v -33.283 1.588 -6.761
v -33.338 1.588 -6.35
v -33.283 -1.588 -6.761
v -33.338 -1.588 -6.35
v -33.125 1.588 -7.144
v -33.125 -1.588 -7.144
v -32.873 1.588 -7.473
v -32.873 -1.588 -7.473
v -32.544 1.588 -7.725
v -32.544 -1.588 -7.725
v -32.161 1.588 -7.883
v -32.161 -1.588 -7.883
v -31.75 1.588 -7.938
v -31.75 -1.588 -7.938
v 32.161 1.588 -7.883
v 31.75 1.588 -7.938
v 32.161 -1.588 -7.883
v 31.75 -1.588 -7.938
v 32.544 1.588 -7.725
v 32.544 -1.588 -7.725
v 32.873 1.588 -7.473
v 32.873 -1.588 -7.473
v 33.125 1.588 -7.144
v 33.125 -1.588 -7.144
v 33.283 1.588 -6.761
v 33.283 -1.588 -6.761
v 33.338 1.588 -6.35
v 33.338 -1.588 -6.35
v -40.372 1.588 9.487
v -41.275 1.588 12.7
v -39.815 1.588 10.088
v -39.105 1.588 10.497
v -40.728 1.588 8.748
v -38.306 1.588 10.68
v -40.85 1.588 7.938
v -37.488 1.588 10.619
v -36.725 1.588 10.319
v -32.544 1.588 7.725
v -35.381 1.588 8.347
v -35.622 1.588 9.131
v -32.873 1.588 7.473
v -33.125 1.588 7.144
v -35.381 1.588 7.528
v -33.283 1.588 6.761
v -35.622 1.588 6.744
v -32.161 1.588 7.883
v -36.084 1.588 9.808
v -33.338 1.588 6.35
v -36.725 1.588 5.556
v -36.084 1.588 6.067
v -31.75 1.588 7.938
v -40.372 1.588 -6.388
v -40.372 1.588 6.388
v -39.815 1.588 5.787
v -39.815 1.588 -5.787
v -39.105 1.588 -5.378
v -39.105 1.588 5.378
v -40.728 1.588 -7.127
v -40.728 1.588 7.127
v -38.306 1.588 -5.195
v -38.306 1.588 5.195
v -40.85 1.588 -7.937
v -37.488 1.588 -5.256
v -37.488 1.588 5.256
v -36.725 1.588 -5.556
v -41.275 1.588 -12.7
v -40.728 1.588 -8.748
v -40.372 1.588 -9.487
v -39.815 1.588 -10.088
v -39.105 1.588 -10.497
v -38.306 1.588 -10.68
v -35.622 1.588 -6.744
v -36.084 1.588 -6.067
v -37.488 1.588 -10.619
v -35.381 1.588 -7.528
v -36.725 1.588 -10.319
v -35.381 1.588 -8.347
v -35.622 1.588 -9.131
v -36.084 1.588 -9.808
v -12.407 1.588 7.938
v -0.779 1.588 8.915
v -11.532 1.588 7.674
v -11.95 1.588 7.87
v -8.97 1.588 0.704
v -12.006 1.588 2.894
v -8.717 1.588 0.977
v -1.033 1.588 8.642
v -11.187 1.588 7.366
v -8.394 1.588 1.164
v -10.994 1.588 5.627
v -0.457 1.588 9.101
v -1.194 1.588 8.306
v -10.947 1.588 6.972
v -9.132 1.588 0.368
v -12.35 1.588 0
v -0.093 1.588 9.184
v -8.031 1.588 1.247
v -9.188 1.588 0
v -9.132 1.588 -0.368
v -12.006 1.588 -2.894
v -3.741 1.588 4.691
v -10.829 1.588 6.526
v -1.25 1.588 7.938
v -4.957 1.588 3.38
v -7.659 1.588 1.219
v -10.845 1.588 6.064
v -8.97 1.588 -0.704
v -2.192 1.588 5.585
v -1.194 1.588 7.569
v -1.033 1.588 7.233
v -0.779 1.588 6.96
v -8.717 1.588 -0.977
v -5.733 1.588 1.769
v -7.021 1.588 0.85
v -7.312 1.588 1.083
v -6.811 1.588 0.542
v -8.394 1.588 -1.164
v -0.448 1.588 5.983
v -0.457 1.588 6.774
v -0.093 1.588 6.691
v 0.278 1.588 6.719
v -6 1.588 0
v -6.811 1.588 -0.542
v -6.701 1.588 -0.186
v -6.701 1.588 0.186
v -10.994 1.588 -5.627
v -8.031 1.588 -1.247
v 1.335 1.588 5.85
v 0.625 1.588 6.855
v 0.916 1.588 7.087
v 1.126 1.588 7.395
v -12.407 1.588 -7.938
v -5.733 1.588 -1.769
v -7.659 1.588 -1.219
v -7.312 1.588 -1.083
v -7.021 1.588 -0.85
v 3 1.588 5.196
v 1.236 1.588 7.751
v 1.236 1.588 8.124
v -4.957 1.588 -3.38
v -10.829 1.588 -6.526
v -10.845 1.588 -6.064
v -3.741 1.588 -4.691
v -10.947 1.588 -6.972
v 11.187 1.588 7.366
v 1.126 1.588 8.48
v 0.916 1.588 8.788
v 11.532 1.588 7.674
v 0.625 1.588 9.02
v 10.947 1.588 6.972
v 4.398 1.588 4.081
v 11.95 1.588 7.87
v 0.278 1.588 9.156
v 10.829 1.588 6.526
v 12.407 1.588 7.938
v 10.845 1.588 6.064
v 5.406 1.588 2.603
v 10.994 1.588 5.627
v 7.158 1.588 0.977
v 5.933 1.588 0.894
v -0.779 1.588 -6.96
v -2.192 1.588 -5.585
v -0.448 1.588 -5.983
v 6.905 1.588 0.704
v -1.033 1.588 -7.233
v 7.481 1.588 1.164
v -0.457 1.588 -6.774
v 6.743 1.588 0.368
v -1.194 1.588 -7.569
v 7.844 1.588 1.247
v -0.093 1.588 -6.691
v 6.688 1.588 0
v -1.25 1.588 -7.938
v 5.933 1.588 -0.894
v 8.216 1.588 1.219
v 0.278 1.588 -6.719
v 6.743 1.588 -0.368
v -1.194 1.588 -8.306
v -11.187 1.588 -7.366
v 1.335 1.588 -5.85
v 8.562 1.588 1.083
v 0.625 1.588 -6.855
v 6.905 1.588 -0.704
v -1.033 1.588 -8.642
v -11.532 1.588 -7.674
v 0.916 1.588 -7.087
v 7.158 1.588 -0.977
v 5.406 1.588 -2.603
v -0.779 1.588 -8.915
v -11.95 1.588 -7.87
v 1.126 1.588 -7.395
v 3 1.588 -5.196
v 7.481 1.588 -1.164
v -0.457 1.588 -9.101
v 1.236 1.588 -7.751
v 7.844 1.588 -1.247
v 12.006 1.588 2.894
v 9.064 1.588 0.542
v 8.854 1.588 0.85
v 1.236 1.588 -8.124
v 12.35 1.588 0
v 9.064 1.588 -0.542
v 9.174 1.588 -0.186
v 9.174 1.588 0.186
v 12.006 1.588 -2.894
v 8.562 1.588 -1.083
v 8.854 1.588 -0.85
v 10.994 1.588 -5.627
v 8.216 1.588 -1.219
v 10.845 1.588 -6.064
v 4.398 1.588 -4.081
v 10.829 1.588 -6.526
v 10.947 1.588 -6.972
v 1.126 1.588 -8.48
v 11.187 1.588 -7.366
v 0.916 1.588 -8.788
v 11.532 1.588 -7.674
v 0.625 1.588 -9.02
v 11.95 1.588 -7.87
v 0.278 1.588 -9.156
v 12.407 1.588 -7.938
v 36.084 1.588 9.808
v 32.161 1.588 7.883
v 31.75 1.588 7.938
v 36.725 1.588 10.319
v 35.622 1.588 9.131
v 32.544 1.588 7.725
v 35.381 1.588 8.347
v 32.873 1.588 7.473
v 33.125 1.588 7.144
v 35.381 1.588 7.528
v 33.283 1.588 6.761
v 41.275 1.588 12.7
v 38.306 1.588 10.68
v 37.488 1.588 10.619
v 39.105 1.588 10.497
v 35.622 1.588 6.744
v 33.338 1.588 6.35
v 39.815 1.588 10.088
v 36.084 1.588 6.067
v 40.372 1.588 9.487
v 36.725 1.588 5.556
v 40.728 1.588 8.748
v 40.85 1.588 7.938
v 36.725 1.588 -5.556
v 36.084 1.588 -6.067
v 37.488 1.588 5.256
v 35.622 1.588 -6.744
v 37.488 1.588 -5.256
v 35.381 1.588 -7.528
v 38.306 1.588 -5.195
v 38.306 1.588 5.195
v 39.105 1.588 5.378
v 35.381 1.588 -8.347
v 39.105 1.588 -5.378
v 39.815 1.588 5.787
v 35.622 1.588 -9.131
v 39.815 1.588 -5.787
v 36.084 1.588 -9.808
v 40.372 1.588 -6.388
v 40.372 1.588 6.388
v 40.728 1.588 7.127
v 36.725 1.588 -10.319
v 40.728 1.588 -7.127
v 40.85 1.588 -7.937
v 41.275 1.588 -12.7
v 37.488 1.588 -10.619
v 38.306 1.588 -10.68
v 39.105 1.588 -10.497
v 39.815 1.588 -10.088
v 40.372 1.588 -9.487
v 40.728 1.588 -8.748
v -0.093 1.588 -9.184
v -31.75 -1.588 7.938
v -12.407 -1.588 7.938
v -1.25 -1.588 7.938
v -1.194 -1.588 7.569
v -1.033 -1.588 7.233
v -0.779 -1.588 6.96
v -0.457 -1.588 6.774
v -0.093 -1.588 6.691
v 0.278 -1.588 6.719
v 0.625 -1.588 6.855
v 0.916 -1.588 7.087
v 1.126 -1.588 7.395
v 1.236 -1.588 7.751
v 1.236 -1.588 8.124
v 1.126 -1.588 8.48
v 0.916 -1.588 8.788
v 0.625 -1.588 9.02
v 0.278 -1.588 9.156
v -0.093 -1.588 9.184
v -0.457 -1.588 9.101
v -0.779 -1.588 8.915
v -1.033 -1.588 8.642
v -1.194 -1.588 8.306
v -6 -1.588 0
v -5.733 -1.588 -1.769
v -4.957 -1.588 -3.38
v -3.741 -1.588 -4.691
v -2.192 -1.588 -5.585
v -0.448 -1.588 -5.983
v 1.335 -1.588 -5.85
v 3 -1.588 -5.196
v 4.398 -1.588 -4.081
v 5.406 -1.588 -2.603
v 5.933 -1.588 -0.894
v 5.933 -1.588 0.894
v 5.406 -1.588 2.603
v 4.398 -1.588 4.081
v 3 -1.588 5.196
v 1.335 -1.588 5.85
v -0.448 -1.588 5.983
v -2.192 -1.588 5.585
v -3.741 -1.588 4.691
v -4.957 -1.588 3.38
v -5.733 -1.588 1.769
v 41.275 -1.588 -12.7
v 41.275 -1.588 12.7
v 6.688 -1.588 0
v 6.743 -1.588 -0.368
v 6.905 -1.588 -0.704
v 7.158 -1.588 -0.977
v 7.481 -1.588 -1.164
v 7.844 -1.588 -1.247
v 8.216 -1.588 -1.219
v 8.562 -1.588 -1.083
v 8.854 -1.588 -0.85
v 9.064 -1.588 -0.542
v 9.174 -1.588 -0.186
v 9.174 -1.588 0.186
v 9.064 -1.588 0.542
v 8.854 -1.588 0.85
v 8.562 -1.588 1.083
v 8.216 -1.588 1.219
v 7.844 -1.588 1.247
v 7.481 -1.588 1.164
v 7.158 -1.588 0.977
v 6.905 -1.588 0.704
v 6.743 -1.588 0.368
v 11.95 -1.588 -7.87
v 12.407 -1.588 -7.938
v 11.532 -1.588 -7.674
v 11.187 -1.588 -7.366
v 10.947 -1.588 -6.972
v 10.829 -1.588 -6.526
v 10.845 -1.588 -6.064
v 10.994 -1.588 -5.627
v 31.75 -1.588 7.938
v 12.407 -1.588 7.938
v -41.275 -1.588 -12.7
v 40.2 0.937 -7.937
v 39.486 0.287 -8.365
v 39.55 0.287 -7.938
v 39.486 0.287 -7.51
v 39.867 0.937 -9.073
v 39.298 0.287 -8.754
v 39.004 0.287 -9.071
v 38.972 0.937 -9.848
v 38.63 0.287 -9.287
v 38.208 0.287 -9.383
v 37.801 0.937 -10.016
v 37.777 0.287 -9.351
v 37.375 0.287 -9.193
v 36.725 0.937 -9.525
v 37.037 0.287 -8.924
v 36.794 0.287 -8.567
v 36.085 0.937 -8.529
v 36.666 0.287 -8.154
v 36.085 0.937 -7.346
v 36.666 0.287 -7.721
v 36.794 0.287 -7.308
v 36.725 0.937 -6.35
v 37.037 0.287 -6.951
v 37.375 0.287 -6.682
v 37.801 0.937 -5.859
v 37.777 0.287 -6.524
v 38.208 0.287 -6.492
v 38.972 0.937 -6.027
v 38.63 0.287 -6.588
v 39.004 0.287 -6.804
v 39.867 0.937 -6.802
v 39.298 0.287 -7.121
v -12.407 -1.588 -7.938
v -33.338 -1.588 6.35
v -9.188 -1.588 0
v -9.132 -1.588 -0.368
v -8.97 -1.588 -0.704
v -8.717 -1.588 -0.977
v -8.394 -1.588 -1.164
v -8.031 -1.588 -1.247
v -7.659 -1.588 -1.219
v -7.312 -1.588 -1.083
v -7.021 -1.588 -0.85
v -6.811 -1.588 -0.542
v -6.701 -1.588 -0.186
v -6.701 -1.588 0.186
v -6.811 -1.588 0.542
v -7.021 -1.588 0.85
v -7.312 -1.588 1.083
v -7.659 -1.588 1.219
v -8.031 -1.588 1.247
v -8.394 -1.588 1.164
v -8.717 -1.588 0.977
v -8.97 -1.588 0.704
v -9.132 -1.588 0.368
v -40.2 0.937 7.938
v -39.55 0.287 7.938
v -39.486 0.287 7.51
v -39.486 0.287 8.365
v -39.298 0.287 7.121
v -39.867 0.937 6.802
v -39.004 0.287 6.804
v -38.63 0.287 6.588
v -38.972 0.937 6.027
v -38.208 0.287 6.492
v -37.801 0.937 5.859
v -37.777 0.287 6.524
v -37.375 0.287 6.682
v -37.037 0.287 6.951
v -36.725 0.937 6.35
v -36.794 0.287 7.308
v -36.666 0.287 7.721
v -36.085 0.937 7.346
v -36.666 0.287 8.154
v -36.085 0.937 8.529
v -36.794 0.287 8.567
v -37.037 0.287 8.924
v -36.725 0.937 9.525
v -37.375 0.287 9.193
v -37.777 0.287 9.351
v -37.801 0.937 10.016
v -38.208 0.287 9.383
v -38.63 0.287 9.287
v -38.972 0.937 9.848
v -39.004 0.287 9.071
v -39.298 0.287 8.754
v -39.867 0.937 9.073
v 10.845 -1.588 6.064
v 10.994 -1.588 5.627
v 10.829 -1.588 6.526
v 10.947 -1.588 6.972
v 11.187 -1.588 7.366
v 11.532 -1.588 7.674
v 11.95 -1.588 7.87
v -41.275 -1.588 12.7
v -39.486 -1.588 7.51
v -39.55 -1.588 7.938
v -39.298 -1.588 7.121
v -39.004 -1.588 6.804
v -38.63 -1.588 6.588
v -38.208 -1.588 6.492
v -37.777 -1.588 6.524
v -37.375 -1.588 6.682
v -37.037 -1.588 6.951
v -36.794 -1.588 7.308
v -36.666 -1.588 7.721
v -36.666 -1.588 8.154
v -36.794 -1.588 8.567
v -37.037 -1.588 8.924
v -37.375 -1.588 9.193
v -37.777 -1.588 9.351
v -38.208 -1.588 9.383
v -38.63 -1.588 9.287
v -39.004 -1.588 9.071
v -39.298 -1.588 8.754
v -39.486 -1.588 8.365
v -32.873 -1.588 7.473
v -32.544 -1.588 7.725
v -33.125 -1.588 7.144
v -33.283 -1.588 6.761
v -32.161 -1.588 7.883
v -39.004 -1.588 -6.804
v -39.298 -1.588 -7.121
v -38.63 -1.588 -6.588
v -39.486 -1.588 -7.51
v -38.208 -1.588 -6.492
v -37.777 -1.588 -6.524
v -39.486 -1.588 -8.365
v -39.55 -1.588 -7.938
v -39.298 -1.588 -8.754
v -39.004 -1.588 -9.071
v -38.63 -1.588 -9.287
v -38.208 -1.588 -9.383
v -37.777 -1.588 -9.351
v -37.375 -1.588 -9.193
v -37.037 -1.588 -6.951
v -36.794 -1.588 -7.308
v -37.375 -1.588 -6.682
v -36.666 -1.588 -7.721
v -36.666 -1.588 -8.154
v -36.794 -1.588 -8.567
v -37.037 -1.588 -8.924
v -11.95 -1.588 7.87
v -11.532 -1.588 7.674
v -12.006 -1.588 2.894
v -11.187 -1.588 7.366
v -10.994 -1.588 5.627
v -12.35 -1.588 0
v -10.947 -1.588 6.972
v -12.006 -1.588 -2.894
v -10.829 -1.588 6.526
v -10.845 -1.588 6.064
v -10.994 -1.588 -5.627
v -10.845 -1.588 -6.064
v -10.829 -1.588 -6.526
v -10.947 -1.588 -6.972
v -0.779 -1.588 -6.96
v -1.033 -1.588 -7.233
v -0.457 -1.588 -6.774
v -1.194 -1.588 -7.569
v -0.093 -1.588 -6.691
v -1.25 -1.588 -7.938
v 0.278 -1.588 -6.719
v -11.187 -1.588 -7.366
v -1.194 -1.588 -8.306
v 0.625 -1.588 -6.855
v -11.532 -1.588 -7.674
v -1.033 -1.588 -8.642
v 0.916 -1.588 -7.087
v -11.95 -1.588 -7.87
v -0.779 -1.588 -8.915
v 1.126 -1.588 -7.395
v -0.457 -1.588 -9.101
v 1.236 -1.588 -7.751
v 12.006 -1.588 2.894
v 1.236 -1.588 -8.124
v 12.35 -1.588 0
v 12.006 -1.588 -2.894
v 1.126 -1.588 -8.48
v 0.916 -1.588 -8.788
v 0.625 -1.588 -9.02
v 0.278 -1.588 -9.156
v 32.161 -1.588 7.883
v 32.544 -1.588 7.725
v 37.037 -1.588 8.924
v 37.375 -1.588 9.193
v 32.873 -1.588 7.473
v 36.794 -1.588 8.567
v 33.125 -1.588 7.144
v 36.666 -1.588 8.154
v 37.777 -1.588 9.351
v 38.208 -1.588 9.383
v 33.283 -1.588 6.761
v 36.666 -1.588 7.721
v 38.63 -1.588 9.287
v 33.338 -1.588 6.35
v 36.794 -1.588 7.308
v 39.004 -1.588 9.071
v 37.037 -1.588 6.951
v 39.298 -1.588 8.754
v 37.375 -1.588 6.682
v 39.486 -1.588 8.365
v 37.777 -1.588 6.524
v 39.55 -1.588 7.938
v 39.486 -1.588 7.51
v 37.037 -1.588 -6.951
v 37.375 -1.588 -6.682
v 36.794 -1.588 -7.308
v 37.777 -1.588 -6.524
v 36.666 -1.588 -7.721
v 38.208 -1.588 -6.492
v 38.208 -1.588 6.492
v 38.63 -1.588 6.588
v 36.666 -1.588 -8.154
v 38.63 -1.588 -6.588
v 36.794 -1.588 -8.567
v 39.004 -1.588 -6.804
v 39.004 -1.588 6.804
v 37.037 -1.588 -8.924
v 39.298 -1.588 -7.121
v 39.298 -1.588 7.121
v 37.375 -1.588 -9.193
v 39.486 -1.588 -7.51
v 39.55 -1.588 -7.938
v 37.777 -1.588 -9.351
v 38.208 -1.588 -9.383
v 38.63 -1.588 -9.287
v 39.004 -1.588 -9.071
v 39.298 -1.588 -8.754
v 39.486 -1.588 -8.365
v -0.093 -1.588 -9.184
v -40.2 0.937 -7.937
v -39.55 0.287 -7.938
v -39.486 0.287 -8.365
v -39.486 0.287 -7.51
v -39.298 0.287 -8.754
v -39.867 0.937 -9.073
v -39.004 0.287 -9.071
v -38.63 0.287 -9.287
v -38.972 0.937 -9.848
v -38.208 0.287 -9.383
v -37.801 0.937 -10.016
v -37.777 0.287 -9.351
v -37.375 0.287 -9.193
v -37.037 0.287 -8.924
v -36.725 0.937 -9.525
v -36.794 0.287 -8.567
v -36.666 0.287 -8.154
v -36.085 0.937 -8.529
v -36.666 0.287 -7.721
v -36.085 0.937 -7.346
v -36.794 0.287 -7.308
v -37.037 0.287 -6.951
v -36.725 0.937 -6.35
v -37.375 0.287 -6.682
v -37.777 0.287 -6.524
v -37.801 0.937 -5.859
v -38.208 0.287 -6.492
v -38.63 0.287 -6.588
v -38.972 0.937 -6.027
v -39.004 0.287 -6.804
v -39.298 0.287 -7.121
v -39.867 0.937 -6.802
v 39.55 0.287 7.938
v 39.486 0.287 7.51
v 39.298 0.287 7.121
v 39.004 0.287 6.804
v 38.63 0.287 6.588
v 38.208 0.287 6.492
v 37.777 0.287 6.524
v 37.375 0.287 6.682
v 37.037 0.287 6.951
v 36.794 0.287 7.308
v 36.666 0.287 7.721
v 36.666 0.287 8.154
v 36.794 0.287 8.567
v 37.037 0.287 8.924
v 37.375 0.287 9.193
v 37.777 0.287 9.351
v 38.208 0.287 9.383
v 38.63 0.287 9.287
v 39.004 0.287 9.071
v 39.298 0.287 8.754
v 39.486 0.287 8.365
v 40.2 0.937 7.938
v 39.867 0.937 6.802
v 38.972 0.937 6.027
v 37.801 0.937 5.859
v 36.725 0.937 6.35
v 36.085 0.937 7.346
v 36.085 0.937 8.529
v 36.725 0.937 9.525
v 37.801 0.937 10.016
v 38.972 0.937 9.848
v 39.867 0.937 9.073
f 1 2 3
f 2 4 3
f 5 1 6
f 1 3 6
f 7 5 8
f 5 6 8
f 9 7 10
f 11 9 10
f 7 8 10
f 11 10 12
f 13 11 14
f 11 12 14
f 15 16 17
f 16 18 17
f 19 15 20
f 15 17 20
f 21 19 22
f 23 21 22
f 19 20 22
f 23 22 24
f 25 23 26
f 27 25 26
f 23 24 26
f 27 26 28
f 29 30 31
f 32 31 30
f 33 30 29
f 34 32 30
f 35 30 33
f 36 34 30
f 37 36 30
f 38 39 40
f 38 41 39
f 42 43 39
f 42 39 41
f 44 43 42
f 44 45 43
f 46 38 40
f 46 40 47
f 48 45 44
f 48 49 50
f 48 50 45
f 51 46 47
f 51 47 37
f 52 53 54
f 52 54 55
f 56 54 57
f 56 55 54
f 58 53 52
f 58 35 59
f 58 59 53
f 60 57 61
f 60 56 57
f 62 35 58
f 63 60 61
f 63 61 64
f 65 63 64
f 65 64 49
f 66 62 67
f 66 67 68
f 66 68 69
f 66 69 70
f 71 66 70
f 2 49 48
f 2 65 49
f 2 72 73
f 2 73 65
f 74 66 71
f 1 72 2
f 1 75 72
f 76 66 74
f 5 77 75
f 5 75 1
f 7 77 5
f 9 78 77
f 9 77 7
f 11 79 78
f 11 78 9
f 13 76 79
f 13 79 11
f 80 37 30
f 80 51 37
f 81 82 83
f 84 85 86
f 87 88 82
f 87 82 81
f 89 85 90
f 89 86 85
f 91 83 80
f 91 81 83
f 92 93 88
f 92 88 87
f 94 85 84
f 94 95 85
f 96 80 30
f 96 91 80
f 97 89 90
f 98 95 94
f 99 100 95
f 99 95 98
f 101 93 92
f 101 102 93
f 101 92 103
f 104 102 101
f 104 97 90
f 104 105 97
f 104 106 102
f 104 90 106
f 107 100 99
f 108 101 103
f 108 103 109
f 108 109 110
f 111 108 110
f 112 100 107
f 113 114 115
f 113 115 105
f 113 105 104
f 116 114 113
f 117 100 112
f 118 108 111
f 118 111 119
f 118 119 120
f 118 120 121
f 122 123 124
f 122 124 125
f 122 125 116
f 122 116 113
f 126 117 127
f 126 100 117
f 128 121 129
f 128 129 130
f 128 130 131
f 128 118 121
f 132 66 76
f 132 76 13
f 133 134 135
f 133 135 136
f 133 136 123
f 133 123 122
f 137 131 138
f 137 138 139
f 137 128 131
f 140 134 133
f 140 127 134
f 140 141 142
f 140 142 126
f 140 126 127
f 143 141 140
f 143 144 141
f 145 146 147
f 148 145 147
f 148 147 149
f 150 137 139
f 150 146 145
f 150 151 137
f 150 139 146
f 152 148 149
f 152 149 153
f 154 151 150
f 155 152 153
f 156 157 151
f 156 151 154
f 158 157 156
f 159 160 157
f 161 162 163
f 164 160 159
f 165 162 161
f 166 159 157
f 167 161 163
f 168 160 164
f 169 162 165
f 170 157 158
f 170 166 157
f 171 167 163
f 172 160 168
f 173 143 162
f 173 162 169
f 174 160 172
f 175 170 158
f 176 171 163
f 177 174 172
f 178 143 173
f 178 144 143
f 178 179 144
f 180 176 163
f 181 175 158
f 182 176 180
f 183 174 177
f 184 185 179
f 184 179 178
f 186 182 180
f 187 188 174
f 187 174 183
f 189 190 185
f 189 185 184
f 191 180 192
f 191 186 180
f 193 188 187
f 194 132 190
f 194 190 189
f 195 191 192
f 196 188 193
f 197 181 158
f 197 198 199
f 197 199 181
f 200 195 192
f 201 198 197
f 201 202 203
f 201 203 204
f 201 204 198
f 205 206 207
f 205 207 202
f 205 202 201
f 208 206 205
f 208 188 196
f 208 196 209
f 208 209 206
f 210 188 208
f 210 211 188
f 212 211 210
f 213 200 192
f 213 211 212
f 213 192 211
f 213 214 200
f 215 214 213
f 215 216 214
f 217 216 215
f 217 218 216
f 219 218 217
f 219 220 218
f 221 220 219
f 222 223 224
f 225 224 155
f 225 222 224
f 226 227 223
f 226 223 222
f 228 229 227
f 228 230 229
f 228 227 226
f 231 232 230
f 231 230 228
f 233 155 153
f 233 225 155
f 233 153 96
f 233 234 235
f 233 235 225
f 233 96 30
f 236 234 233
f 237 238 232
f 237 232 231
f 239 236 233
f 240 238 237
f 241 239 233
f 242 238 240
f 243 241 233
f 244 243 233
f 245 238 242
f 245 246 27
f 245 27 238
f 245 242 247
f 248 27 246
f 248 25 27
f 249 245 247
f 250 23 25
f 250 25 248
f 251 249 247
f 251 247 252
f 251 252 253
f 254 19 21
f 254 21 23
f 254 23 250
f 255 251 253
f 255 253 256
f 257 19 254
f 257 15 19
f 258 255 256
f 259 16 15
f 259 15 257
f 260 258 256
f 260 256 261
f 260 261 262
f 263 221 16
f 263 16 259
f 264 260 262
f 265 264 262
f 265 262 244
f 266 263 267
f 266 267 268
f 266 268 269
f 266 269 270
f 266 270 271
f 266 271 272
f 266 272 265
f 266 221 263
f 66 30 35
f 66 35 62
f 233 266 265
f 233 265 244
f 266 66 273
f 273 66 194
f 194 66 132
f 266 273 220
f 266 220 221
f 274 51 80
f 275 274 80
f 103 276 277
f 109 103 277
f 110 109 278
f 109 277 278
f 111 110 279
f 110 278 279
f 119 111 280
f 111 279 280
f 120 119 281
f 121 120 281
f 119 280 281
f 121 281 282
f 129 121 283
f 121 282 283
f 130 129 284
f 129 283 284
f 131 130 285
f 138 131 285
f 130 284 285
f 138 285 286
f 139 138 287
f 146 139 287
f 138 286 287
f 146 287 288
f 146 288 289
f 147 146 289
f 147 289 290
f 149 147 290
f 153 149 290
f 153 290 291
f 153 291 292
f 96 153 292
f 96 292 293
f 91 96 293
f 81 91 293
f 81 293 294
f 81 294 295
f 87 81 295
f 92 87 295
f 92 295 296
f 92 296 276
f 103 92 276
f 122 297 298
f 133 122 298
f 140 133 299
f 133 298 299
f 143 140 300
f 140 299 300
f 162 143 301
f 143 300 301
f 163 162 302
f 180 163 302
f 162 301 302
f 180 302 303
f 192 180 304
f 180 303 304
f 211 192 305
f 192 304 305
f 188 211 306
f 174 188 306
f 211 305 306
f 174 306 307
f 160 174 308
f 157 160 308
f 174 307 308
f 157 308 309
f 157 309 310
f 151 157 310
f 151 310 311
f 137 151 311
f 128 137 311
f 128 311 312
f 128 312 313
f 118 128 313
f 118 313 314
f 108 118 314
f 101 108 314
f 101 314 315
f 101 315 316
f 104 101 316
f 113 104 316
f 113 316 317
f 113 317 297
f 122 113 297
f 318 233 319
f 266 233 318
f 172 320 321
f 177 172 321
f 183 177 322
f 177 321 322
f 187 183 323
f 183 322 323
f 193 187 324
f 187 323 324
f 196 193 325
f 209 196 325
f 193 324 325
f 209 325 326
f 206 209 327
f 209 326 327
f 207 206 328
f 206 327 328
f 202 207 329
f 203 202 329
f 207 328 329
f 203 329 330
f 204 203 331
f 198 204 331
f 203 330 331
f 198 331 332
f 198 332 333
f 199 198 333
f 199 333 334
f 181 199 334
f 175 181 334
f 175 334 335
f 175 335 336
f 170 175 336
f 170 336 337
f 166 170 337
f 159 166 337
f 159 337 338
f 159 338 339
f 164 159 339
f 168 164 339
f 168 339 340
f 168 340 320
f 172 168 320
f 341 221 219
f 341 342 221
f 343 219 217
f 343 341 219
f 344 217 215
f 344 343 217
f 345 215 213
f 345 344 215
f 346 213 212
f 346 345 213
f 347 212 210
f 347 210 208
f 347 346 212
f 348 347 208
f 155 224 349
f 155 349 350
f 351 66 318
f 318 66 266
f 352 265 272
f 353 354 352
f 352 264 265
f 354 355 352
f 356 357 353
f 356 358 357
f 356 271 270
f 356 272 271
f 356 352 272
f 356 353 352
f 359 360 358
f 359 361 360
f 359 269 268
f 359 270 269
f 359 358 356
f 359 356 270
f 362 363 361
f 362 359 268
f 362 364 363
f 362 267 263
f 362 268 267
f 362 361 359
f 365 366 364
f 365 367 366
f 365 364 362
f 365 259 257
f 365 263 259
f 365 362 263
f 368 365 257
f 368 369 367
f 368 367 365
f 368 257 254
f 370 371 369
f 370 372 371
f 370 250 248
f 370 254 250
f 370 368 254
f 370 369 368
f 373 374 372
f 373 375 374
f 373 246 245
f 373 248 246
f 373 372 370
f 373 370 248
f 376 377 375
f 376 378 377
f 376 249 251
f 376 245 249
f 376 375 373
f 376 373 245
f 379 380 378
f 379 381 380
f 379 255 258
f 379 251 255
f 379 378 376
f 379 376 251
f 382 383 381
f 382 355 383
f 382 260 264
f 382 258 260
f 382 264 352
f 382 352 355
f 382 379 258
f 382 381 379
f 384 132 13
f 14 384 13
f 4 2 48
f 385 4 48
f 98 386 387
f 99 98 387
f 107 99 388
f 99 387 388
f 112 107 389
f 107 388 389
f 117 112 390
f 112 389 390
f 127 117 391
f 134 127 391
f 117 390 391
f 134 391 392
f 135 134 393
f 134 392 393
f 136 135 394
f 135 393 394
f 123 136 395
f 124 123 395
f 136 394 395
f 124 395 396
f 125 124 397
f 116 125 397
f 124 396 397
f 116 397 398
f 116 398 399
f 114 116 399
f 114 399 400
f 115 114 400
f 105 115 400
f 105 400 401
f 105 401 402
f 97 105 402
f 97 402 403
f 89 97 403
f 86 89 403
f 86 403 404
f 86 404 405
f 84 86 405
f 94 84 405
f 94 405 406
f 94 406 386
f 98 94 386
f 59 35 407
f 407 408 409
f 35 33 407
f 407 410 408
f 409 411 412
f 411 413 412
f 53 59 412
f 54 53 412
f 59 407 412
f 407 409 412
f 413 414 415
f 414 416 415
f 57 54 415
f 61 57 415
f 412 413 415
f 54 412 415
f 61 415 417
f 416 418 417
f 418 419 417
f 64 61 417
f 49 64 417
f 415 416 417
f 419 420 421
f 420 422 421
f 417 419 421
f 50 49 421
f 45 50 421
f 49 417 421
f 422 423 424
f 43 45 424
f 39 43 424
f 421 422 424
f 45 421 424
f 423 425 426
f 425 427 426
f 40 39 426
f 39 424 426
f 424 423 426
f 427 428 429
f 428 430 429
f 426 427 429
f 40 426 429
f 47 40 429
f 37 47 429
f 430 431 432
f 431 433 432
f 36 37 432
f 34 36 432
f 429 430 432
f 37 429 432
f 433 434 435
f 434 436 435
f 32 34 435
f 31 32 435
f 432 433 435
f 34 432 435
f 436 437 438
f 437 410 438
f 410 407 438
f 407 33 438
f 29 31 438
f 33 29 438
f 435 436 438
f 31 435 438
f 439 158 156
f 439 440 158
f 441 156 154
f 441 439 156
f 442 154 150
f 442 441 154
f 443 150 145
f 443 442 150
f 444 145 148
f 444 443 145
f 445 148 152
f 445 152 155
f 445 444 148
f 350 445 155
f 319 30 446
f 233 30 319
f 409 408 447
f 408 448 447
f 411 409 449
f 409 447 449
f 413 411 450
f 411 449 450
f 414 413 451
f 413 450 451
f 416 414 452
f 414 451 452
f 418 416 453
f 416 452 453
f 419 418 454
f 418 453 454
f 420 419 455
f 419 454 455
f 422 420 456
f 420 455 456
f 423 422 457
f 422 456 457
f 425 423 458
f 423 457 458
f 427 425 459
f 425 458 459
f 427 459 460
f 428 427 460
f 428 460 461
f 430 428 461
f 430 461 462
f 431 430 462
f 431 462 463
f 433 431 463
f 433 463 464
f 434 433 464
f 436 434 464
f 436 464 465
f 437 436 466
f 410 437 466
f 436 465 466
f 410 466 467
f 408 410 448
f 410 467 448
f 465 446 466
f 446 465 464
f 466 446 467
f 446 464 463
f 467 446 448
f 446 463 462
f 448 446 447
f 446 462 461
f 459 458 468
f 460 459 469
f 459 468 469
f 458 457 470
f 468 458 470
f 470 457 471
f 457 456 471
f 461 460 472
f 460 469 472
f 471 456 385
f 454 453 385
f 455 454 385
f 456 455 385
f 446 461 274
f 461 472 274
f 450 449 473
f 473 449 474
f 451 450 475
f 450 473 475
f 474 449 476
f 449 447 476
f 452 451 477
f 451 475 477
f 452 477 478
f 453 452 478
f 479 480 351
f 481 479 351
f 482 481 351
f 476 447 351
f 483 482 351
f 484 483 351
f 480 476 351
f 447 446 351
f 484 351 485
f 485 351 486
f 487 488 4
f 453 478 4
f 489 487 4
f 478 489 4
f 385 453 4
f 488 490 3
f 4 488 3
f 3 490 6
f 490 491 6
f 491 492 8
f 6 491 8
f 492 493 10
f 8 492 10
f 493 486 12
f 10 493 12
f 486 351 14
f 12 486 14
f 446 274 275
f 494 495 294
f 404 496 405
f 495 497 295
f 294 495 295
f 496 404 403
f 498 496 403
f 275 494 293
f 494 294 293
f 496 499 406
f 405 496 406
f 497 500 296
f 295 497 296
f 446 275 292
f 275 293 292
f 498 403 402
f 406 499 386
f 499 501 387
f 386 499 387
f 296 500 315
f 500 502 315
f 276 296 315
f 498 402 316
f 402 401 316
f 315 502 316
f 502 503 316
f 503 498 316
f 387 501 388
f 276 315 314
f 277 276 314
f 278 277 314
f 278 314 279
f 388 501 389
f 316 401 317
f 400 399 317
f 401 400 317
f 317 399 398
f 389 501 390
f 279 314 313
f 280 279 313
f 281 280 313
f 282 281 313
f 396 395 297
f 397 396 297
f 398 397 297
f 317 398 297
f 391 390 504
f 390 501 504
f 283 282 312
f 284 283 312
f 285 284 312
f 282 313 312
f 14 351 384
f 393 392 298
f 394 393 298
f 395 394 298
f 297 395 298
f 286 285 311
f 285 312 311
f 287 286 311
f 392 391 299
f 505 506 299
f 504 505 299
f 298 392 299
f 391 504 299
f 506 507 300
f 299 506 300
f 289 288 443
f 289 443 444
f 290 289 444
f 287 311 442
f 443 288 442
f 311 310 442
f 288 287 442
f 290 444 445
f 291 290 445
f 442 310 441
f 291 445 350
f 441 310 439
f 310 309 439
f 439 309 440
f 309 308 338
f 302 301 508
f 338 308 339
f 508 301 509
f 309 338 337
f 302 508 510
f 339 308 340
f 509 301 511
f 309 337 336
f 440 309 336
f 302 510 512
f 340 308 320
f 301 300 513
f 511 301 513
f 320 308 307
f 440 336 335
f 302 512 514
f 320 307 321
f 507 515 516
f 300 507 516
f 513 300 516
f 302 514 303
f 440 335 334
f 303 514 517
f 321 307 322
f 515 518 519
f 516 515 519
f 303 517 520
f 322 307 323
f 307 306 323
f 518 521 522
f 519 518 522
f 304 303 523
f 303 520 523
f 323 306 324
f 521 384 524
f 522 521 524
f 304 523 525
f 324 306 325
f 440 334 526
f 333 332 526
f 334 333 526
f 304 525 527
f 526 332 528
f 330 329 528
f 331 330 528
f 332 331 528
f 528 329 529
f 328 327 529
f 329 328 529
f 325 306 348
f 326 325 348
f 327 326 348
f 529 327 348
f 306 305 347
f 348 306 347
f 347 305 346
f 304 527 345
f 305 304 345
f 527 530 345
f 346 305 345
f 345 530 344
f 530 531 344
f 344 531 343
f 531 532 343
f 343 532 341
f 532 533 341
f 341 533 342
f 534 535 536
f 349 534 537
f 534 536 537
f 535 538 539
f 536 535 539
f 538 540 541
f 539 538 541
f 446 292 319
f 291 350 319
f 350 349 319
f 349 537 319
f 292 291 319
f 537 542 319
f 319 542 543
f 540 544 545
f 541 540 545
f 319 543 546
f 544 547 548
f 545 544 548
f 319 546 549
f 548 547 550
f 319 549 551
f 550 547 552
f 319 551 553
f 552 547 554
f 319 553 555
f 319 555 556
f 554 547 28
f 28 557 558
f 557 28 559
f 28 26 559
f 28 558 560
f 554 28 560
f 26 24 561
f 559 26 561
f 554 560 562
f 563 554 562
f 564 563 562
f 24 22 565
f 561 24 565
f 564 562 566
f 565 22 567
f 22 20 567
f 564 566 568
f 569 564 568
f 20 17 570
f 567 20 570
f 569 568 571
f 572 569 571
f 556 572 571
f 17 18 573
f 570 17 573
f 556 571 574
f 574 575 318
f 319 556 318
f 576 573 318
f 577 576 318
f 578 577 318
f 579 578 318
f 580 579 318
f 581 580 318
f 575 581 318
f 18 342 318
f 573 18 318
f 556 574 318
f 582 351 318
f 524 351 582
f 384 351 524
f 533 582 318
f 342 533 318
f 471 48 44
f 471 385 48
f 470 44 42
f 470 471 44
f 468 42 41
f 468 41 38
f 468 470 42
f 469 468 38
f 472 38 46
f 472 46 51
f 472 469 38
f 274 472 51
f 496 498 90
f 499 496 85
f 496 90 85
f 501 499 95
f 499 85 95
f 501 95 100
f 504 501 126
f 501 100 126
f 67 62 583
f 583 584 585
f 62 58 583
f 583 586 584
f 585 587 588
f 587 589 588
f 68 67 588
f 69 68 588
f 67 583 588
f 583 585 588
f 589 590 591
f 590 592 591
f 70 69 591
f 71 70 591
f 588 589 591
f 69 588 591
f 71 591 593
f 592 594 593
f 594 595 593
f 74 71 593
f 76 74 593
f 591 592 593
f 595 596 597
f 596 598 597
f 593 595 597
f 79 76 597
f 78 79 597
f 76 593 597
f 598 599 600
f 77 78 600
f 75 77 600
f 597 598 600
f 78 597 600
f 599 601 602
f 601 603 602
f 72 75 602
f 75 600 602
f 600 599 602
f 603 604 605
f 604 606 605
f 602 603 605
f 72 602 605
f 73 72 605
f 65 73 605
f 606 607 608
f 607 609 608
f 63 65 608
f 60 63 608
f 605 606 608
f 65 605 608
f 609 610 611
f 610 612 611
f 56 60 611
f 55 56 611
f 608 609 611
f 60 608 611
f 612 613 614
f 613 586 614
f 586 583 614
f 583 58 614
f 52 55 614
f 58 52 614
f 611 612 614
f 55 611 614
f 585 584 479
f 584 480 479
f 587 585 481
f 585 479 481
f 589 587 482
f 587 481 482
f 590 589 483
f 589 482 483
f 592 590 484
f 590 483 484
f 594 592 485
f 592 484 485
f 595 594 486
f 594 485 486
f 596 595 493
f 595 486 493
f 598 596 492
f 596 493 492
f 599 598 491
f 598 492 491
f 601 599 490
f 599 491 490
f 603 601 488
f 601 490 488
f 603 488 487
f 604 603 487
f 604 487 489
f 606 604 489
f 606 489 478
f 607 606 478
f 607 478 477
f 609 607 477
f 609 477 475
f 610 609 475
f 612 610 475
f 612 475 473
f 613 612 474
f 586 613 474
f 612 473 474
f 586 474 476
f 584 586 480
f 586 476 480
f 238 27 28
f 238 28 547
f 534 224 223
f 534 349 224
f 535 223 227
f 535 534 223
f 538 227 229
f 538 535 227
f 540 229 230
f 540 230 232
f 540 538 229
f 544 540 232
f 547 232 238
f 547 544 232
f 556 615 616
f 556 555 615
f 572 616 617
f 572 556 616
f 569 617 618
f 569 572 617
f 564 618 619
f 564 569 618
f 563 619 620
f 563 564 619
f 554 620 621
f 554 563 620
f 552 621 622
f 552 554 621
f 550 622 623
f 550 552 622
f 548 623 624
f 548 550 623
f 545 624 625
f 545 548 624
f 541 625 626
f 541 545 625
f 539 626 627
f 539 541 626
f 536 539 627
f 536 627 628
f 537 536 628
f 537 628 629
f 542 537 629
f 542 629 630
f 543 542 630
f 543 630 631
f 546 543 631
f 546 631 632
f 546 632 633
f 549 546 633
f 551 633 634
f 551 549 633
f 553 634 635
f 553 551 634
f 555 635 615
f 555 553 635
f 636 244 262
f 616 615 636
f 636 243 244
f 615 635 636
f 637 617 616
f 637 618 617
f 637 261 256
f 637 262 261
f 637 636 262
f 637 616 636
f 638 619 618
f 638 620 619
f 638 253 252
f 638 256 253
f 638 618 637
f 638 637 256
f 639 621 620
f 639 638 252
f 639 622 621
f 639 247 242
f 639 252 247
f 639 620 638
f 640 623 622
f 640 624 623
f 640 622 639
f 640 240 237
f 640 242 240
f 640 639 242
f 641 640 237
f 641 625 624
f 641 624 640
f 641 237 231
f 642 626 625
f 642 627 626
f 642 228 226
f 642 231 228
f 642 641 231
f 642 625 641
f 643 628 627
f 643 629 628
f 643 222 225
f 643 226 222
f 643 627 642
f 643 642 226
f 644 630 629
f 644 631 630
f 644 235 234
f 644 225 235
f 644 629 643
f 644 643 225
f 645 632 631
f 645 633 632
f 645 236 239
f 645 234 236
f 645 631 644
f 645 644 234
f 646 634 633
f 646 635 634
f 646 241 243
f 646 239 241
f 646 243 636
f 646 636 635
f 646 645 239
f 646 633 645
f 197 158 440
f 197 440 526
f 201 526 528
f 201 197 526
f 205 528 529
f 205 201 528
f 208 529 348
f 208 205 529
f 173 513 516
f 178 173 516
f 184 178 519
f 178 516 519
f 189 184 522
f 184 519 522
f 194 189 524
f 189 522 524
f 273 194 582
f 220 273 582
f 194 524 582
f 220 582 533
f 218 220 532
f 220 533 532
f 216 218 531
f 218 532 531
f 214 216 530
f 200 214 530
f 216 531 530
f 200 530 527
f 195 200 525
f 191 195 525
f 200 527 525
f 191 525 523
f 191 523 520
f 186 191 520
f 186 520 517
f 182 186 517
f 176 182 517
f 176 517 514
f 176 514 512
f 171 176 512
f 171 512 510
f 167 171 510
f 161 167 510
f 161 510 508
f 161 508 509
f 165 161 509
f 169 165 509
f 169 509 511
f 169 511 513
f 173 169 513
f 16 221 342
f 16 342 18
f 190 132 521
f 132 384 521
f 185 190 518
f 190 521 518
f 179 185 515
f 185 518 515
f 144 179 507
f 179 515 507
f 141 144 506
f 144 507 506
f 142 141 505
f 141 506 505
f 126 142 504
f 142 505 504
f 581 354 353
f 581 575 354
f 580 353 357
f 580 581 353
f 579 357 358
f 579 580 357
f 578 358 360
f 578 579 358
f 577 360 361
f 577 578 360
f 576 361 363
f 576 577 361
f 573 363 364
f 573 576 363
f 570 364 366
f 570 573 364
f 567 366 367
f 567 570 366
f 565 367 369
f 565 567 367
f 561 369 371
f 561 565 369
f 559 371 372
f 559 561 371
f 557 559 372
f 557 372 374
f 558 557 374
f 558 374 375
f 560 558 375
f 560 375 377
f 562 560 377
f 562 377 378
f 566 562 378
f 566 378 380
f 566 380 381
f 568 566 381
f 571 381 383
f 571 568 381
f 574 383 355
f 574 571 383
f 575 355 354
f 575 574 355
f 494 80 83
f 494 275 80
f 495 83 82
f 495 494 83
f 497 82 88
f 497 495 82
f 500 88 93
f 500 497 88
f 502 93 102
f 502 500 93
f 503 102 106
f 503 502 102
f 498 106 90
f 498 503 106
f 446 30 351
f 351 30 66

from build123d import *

# Parameters (mm, degrees)
SKETCH1_W                                         = 82.55
SKETCH1_H                                         = 25.4
BOSS_EXTRUDE1_DEPTH                               = 1.5875
F_12_0MM_DOWEL_HOLE1_D                            = 12
M3X0_5_TAPPED_HOLE1_D                             = 2.5
CSK_FOR_M2_5_FLAT_HEAD_MACHINE_SCREW1_D           = 2.9
CSK_FOR_M2_5_FLAT_HEAD_MACHINE_SCREW1_CSINK_D     = 5.5
CSK_FOR_M2_5_FLAT_HEAD_MACHINE_SCREW1_CSINK_ANGLE = 90
CUT_EXTRUDE1_DEPTH                                = 44.301226888
FILLET1_R                                         = 1.5875


with BuildPart() as part:
    # Sketch1 → Boss-Extrude1 (new, symmetric)
    with BuildSketch(Plane(origin=(0, 0, 0), x_dir=(1, 0, 0), z_dir=(0, 1, 0))):
        Rectangle(SKETCH1_W, SKETCH1_H)
    extrude(amount=BOSS_EXTRUDE1_DEPTH, both=True)

    # Ø12.0mm Dowel Hole1 (through all)
    with Locations(Plane(origin=(0, 1.5875, 0), x_dir=(1, 0, 0), z_dir=(0, 1, 0))):
        with Locations((0, 0)):
            Hole(F_12_0MM_DOWEL_HOLE1_D / 2)

    # M3x0.5 Tapped Hole1 (through all)
    with Locations(Plane(origin=(0, 1.5875, 0), x_dir=(1, 0, 0), z_dir=(0, 1, 0))):
        with Locations((0, 7.9375), (-7.9375, 0), (7.9375, 0), (0, -7.9375)):
            Hole(M3X0_5_TAPPED_HOLE1_D / 2)

    # CSK for M2.5 Flat Head Machine Screw1 (through all)
    with Locations(Plane(origin=(0, 1.5875, 0), x_dir=(1, 0, 0), z_dir=(0, 1, 0))):
        with Locations((-38.1, 7.9375), (-38.1, -7.9375)):
            csk_for_m2_5_flat_head_machine_screw1 = CounterSinkHole(CSK_FOR_M2_5_FLAT_HEAD_MACHINE_SCREW1_D / 2, CSK_FOR_M2_5_FLAT_HEAD_MACHINE_SCREW1_CSINK_D / 2, counter_sink_angle=CSK_FOR_M2_5_FLAT_HEAD_MACHINE_SCREW1_CSINK_ANGLE)

    # Mirror1: CSK for M2.5 Flat Head Machine Screw1 across plane
    add(csk_for_m2_5_flat_head_machine_screw1.mirror(Plane(origin=(0, 0, 0), x_dir=(0, 0, 1), z_dir=(1, 0, 0))), mode=Mode.SUBTRACT)

    # Sketch14 → Cut-Extrude1 (cut, through all)
    with BuildSketch(Plane(origin=(0, 1.5875, 0), x_dir=(1, 0, 0), z_dir=(0, 1, 0))):
        with BuildLine():
            Line((-33.3375, 7.9375), (-33.3375, -7.9375))
            Line((-33.3375, -7.9375), (-9.461426623, -7.9375))
            ThreePointArc((-9.461426623, -7.9375), (-12.35, 0), (-9.461426623, 7.9375))
            Line((-9.461426623, 7.9375), (-33.3375, 7.9375))
        make_face()
    cut_extrude1 = extrude(amount=-CUT_EXTRUDE1_DEPTH, mode=Mode.SUBTRACT)

    # Mirror2: Cut-Extrude1 across plane
    add(cut_extrude1.mirror(Plane(origin=(0, 0, 0), x_dir=(0, 0, 1), z_dir=(1, 0, 0))), mode=Mode.SUBTRACT)

    # Fillet1
    fillet1_edges = [part.edges().sort_by_distance(p)[0] for p in [
        (-33.3375, 0, -7.9375),
        (-9.461426623, 0, -7.9375),
        (-9.461426623, 0, 7.9375),
        (-33.3375, 0, 7.9375),
        (9.461426623, 0, -7.9375),
        (33.3375, 0, -7.9375),
        (33.3375, 0, 7.9375),
        (9.461426623, 0, 7.9375),
    ]]
    fillet(fillet1_edges, radius=FILLET1_R)


solid = part.part
